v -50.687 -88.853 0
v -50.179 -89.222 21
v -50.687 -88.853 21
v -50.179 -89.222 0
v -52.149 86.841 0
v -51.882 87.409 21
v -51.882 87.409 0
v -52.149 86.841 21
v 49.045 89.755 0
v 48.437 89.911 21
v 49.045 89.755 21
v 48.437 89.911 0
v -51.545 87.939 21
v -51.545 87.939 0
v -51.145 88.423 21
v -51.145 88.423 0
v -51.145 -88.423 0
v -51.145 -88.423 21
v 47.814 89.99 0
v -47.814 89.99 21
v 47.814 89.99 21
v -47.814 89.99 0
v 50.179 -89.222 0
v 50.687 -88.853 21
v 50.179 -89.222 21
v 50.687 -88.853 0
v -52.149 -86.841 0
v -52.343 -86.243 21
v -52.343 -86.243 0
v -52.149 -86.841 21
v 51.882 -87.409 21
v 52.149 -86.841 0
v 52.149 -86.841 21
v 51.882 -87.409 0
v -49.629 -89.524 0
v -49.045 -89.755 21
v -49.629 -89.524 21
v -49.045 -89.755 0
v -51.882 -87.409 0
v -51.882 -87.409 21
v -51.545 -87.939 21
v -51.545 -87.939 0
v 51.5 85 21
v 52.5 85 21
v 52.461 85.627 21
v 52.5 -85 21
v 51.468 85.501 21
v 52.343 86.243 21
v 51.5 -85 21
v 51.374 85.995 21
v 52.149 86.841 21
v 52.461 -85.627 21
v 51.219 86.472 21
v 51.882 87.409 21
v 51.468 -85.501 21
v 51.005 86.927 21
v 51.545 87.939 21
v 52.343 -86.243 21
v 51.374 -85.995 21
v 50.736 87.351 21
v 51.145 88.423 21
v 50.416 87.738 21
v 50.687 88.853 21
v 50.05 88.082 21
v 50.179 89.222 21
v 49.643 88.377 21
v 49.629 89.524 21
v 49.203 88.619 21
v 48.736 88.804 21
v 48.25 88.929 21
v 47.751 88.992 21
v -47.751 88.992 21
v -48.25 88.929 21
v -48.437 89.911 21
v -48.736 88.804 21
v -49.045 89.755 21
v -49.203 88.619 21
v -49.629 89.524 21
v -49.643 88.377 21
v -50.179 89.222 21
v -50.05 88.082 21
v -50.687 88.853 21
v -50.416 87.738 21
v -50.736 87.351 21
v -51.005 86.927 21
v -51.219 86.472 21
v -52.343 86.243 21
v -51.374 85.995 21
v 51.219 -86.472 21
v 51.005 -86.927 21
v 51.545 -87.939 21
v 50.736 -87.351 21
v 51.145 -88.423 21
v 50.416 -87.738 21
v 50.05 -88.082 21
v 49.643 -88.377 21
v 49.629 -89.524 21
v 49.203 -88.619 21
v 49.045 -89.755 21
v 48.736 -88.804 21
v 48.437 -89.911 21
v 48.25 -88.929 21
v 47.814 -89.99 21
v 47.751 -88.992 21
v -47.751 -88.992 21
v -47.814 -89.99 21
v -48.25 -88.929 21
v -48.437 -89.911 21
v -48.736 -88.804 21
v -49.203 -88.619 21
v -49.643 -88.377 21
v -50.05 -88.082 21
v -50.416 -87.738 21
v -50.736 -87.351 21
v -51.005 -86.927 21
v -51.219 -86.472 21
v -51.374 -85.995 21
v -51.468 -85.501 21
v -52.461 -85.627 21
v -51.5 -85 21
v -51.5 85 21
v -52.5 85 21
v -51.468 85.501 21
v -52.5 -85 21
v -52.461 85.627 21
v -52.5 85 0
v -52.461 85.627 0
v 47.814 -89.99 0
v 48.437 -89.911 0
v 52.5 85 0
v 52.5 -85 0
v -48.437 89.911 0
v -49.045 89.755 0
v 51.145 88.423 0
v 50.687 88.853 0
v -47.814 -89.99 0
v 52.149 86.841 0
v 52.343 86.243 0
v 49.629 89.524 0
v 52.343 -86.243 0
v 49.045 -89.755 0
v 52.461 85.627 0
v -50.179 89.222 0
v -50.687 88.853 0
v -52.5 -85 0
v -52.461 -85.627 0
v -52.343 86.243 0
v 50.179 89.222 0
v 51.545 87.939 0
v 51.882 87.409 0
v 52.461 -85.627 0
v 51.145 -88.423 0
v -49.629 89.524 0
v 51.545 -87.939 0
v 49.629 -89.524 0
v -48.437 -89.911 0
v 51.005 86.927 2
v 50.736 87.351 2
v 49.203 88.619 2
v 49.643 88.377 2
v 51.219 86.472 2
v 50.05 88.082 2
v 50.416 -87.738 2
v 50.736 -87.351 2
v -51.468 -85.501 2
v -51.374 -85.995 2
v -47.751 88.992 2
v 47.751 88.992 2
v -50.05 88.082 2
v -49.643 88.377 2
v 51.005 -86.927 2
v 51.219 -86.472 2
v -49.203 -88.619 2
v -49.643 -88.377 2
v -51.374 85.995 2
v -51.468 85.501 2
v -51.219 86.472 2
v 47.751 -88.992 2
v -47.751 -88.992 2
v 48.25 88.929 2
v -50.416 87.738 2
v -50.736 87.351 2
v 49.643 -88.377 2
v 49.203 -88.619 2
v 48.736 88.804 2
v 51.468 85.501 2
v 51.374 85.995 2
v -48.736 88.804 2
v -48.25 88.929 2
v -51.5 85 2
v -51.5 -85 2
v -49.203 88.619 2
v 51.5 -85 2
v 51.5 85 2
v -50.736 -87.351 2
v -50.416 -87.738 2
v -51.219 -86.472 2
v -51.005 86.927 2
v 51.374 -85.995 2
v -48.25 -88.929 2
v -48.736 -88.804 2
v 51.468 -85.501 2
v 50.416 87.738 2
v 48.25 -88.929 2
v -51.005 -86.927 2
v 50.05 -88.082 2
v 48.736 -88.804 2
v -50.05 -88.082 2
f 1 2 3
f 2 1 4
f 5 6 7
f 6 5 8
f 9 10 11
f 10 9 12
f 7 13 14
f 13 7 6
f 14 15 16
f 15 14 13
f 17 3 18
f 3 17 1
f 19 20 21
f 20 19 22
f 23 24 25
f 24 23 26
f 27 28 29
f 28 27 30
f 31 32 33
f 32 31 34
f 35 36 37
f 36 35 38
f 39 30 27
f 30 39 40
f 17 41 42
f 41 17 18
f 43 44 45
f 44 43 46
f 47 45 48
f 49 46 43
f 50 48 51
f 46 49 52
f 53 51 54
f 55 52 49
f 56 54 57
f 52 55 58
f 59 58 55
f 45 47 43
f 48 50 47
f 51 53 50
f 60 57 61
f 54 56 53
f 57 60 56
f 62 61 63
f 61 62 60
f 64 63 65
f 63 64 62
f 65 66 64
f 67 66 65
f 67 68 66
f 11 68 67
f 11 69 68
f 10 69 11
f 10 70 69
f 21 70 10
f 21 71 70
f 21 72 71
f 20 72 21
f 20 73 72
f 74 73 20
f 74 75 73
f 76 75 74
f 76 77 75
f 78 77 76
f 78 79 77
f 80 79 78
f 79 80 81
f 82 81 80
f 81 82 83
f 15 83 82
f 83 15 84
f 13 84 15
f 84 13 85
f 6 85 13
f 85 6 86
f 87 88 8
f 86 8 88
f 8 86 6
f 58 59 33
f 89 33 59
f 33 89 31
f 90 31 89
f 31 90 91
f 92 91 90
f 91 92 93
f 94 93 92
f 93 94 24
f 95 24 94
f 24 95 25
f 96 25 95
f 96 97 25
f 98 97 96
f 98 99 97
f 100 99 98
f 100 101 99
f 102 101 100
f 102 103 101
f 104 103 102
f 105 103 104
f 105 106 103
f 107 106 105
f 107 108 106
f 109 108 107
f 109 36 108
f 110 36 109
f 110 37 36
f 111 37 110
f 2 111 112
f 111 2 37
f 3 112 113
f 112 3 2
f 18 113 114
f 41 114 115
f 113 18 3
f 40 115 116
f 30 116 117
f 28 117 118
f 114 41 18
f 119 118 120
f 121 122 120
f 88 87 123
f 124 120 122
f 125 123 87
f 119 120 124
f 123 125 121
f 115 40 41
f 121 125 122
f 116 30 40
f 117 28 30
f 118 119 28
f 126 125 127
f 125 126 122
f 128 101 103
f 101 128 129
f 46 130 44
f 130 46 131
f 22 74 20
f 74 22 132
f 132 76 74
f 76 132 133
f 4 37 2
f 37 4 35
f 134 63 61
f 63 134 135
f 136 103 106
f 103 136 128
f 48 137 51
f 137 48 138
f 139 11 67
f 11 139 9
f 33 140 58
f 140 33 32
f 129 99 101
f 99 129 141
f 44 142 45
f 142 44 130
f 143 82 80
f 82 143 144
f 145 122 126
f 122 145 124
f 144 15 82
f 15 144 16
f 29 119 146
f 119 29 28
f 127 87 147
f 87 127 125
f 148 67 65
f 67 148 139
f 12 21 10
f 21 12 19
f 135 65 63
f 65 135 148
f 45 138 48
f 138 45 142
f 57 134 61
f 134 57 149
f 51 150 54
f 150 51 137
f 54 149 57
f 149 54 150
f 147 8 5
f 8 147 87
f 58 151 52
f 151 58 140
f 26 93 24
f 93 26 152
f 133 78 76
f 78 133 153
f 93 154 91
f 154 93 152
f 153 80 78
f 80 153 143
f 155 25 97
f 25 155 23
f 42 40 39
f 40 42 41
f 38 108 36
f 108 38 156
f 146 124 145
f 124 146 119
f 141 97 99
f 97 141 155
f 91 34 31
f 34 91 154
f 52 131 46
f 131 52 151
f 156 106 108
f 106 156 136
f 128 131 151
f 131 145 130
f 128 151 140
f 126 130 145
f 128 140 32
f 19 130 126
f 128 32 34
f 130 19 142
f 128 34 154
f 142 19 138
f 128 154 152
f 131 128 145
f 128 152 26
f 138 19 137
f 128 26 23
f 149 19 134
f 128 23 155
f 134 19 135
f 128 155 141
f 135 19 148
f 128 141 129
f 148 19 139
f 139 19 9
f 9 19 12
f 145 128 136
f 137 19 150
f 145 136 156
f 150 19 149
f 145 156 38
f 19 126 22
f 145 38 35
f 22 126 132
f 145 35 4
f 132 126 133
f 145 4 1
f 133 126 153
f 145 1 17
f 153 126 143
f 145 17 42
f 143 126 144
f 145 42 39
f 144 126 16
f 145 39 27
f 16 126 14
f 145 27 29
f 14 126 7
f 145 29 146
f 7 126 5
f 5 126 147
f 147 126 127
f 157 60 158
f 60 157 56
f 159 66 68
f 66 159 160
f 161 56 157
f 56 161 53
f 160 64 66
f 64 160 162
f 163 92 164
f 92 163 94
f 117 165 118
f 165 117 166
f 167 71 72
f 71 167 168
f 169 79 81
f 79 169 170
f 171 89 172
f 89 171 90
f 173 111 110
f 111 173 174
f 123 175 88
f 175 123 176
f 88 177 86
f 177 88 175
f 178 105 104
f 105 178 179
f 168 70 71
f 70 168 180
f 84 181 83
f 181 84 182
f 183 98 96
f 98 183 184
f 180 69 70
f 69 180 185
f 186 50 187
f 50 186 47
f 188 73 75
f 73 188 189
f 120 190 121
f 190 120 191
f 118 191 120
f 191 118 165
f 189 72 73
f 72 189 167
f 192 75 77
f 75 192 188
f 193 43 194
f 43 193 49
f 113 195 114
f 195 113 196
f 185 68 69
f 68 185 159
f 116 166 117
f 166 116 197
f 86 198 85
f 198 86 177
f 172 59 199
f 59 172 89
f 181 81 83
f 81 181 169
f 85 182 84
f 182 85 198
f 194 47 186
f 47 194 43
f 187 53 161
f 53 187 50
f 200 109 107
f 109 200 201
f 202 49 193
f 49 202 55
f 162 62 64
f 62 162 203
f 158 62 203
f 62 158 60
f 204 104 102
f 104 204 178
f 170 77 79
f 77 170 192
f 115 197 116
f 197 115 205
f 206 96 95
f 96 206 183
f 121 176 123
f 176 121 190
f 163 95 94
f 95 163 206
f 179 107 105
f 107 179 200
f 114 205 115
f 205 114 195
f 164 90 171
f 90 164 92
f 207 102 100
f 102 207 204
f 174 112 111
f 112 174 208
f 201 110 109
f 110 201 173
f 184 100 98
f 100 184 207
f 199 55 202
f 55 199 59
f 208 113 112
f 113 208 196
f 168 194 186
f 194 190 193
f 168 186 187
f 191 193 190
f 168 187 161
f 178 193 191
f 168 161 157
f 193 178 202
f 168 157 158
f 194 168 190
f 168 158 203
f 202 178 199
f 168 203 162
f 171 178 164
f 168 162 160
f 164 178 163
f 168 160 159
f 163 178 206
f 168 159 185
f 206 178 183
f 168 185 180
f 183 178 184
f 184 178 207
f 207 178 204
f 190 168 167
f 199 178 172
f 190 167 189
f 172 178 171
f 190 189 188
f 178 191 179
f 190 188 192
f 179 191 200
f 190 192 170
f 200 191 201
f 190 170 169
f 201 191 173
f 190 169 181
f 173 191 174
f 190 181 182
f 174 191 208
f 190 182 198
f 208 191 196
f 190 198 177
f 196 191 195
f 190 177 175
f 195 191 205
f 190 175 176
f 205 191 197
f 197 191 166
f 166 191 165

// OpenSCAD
$fn = 50;


difference() {
	union() {
		hull() {
			translate(v = [-47.5000000000, 85.0000000000, 0]) {
				cylinder(h = 21, r = 5);
			}
			translate(v = [47.5000000000, 85.0000000000, 0]) {
				cylinder(h = 21, r = 5);
			}
			translate(v = [-47.5000000000, -85.0000000000, 0]) {
				cylinder(h = 21, r = 5);
			}
			translate(v = [47.5000000000, -85.0000000000, 0]) {
				cylinder(h = 21, r = 5);
			}
		}
	}
	union() {
		translate(v = [0, 0, 2]) {
			hull() {
				translate(v = [-47.5000000000, 85.0000000000, 0]) {
					cylinder(h = 19, r = 4);
				}
				translate(v = [47.5000000000, 85.0000000000, 0]) {
					cylinder(h = 19, r = 4);
				}
				translate(v = [-47.5000000000, -85.0000000000, 0]) {
					cylinder(h = 19, r = 4);
				}
				translate(v = [47.5000000000, -85.0000000000, 0]) {
					cylinder(h = 19, r = 4);
				}
			}
		}
	}
}
